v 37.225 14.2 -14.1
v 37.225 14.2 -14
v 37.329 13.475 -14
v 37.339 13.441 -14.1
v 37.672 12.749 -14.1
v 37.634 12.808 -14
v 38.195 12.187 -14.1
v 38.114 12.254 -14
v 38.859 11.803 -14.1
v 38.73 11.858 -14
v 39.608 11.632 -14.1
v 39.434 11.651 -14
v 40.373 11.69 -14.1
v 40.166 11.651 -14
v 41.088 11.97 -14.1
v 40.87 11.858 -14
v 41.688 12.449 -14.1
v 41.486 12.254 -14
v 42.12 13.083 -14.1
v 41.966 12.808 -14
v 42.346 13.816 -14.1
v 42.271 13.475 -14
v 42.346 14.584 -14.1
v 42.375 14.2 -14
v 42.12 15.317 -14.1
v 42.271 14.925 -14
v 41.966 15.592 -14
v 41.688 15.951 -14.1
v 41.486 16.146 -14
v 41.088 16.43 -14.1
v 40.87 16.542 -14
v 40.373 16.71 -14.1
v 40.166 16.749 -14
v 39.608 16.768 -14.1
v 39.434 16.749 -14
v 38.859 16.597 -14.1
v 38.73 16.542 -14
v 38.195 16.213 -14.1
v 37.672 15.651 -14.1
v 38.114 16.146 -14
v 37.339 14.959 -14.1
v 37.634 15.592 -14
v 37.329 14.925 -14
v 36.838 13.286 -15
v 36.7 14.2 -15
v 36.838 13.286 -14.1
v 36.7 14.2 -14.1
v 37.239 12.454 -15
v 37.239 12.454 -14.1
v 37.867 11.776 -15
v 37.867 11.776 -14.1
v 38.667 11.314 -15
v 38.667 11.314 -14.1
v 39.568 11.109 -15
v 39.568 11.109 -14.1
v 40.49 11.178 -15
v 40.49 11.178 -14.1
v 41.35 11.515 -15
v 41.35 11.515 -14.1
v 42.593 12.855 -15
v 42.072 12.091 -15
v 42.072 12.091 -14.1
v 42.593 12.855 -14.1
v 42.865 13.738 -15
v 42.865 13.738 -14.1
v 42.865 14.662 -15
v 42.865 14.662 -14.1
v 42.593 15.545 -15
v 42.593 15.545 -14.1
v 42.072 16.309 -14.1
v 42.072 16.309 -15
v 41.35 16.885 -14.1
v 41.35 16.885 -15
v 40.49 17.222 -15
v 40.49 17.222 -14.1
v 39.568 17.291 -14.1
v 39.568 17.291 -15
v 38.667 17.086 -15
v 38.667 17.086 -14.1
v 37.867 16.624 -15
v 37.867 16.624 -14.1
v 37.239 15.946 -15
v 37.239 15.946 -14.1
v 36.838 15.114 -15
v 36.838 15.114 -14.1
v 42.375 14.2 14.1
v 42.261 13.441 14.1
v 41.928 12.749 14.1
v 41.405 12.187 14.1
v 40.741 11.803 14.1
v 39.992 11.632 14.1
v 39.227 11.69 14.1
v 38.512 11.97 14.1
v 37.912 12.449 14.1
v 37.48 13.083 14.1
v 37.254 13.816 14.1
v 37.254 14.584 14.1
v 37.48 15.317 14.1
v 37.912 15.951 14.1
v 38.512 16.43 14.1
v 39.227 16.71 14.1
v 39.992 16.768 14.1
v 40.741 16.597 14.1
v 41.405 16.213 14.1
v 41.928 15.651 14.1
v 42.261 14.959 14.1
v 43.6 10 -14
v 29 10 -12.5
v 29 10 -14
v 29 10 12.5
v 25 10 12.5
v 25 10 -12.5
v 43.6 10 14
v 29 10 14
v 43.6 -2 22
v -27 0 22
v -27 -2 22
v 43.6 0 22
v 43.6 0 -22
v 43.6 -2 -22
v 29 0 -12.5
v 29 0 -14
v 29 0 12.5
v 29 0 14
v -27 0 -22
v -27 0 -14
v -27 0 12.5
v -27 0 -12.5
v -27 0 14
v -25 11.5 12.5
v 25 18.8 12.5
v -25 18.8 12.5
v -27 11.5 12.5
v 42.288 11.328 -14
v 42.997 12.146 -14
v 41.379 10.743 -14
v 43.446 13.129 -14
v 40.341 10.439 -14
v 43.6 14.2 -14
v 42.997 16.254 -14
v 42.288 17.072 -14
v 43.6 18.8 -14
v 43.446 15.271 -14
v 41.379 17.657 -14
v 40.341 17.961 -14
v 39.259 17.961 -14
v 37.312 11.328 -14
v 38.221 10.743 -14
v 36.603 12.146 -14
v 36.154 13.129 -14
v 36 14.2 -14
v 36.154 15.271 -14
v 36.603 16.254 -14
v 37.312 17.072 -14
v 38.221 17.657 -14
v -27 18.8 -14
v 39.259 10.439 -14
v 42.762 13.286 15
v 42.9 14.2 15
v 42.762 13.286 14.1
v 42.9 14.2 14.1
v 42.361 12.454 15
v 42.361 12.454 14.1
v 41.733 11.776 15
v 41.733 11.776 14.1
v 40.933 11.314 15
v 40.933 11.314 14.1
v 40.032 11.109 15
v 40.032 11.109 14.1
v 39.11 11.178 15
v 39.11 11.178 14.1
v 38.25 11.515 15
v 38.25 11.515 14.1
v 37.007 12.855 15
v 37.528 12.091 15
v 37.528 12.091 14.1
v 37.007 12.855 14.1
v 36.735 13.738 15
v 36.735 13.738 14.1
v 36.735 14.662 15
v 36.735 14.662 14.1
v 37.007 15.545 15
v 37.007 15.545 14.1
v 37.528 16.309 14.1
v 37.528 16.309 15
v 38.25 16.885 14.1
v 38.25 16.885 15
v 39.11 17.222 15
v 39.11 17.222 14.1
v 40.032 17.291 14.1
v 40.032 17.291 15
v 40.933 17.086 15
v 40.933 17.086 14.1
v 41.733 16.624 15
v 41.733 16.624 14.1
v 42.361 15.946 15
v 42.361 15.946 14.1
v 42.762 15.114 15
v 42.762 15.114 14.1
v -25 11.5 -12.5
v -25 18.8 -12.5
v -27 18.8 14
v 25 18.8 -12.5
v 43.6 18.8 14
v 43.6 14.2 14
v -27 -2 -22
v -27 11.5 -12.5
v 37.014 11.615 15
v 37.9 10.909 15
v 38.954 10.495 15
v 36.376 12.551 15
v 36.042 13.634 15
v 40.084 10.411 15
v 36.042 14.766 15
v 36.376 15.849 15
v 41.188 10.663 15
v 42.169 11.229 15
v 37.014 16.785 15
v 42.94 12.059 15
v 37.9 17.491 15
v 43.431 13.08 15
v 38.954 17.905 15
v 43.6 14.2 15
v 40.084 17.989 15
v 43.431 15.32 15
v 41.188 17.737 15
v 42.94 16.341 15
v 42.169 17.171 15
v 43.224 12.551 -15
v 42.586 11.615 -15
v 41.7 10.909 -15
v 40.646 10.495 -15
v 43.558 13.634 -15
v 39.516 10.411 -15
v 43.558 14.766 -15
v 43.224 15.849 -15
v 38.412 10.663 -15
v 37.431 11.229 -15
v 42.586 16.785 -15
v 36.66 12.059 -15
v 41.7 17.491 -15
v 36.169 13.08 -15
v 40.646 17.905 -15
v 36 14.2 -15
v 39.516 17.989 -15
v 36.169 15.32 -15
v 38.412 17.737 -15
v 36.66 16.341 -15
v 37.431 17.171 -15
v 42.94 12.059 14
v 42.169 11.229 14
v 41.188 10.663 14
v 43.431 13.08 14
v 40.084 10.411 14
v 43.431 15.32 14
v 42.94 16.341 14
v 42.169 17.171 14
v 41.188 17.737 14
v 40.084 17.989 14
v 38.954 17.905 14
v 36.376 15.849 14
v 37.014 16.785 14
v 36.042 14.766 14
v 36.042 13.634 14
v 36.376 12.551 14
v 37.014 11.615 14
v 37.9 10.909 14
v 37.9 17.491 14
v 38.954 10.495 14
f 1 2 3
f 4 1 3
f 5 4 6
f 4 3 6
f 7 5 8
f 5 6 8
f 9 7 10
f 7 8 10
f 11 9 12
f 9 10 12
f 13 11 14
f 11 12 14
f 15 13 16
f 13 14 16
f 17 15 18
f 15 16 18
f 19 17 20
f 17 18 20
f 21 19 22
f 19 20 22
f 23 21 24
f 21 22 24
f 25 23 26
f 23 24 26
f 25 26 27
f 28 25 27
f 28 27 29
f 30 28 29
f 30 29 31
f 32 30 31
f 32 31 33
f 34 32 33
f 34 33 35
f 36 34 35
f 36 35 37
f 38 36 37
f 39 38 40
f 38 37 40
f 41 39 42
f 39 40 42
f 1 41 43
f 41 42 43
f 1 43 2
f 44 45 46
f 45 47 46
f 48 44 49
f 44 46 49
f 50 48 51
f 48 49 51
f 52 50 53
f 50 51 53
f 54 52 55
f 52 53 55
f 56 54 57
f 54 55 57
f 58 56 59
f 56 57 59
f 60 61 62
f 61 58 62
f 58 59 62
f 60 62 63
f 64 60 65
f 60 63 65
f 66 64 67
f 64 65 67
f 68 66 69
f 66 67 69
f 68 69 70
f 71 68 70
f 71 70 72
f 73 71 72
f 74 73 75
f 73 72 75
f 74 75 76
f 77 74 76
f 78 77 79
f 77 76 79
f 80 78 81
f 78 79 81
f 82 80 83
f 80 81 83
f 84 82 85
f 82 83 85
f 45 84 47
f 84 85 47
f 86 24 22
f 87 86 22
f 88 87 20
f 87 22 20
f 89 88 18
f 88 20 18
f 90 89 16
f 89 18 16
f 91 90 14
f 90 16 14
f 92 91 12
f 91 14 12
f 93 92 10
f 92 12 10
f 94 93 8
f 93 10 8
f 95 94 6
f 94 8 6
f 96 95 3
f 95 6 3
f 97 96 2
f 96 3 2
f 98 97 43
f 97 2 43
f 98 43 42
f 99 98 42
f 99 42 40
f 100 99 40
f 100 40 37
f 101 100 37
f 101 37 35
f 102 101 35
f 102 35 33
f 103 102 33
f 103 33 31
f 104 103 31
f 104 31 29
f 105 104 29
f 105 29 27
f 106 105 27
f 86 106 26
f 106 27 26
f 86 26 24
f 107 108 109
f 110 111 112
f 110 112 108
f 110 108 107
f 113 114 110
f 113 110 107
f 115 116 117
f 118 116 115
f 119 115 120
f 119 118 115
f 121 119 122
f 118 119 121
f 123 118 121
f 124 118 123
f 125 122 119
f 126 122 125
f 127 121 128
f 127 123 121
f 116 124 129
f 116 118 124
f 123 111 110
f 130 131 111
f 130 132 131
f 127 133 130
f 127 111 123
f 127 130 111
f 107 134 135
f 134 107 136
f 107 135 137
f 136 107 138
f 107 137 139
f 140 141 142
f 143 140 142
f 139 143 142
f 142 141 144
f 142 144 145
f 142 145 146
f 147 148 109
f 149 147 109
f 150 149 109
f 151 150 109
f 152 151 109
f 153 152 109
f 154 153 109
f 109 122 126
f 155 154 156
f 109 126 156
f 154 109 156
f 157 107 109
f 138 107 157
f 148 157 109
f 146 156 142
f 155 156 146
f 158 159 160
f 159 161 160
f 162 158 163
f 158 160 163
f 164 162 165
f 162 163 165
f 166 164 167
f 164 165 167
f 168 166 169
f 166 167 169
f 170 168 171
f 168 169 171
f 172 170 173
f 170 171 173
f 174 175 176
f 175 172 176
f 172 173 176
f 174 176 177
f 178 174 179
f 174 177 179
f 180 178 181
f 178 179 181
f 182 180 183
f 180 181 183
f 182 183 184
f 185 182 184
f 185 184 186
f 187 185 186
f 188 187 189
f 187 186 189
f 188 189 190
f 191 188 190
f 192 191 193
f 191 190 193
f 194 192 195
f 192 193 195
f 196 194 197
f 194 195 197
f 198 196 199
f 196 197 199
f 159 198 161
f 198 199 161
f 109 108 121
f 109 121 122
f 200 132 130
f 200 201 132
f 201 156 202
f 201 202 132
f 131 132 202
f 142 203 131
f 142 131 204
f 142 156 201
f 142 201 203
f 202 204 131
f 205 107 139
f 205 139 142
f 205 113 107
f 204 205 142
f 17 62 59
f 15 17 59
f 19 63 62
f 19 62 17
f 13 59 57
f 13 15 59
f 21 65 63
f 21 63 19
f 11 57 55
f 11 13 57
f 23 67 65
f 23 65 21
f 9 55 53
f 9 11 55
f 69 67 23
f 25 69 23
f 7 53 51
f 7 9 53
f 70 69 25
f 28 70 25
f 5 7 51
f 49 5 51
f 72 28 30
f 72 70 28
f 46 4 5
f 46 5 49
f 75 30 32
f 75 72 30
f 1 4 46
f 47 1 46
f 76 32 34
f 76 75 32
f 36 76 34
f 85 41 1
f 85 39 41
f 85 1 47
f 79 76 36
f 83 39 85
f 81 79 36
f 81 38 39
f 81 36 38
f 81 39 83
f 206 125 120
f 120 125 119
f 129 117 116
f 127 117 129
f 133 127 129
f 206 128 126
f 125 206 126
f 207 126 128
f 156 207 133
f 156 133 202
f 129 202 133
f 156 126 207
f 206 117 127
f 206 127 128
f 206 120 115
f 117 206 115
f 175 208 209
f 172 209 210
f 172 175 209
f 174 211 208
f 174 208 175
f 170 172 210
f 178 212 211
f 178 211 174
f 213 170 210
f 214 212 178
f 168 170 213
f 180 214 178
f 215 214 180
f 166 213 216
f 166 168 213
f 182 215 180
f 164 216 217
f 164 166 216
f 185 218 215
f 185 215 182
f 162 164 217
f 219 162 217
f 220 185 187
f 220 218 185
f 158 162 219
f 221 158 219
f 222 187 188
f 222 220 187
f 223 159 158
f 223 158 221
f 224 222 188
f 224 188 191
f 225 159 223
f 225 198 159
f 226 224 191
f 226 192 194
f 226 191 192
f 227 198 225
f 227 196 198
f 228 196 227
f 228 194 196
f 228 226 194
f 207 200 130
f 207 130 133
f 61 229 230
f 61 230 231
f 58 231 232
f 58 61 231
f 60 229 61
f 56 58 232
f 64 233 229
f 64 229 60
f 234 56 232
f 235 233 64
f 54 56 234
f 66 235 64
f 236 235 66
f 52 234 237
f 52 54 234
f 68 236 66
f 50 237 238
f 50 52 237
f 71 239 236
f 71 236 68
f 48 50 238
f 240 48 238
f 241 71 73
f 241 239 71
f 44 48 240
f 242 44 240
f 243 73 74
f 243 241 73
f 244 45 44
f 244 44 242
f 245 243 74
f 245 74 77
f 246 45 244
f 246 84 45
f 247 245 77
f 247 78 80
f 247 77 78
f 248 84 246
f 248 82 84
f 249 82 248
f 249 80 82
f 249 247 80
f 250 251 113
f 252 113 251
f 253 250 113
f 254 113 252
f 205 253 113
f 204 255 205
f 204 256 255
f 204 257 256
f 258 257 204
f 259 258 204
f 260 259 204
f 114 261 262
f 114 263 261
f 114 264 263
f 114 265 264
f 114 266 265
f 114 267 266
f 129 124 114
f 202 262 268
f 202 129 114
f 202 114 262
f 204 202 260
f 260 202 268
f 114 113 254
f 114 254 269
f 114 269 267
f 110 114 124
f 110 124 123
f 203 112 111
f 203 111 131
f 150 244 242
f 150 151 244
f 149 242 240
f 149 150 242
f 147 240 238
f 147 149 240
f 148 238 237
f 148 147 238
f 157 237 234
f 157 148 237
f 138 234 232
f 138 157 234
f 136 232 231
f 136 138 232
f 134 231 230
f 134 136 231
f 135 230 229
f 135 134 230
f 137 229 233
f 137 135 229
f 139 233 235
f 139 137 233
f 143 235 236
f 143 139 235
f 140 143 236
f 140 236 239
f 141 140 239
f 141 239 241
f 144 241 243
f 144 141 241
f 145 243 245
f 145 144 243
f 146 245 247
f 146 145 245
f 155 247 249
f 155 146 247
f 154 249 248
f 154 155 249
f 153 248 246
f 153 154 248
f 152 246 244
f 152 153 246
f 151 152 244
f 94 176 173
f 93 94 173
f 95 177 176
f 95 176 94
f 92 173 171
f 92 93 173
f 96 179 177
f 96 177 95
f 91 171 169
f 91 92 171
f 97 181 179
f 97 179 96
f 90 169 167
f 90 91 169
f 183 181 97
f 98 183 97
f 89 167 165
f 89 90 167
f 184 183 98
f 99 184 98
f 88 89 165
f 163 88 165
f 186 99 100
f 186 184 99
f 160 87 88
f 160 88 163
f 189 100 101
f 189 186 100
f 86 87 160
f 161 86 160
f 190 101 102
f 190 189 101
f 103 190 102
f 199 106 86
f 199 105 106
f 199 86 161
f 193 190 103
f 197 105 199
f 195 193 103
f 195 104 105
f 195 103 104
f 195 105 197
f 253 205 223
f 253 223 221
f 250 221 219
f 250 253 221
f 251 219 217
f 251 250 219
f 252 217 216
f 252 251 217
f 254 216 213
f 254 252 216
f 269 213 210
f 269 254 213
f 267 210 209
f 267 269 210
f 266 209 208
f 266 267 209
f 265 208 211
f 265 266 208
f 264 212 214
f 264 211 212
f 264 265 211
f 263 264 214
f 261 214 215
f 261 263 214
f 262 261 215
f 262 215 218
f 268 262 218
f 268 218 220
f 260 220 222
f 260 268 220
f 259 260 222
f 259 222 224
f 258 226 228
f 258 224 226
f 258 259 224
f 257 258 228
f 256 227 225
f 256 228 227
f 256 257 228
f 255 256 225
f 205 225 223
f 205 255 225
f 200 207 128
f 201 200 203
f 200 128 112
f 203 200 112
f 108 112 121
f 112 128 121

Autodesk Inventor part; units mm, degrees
ref_plane "YZ Plane" through (0, 0, 0) normal (1, 0, 0) x (0, 1, 0)
ref_plane "XZ Plane" through (0, 0, 0) normal (0, 1, 0) x (-1, 0, 0)
ref_plane "XY Plane" through (0, 0, 0) normal (0, 0, 1) x (1, 0, 0)
sketch "Sketch1" plane through (0, 0, 0) normal (0, 1, 0) x (-1, 0, 0)
  line L0 (-25, 12.5) -> (25, 12.5)
  line L1 (25, 12.5) -> (25, -12.5)
  line L2 (25, -12.5) -> (-25, -12.5)
  line L3 (-25, -12.5) -> (-25, 12.5)
  line L4 (-25, 12.5) -> (25, -12.5) construction
  line L5 (25, 12.5) -> (-25, -12.5) construction
  line L6 (27, 14) -> (27, -14)
  line L7 (-25, 12.5) -> (-25, 14)
  line L8 (-25, 14) -> (27, 14)
  line L9 (27, -14) -> (-25, -14)
  line L10 (-25, -14) -> (-25, -12.5)
  line L11 (25, 12.5) -> (27, 12.5)
  line L12 (25, -12.5) -> (27, -12.5)
  line L13 (-25, -14) -> (27, -14)
  line L14 (27, -14) -> (27, -22)
  line L15 (27, -22) -> (-25, -22)
  line L16 (-25, -22) -> (-25, -14)
  line L17 (27, 0) -> (-25, 0)
  line L18 (-25, 14) -> (27, 14)
  line L19 (27, 14) -> (27, 22)
  line L20 (27, 22) -> (-25, 22)
  line L21 (-25, 22) -> (-25, 14)
  point P0 (0, 0)
  point P1 (27, 14)
  dimension "d0" = 25
  dimension "d1" = 50
  dimension "d2" = 2
  dimension "d3" = 1.5
  dimension "d4" = 1.5
  dimension "d60" = 8
extrude "Extrusion1" add sketch "Sketch1" against normal blind 2 contours L7 L8 L6 L11 L0 | L0 L1 L17 L3 | L11 L6 L17 L1 | L17 L1 L2 L3 | L17 L6 L12 L1 | L2 L12 L6 L9 L10
extrude "Extrusion2" add sketch "Sketch1" along normal blind 18.8 contours L7 L8 L6 L11 L0 | L2 L12 L6 L9 L10
sketch "Sketch2" plane through (-27, 0, -12.5) normal (0, 0, 1) x (1, 0, 0)
  line L0 (0, 18.8) -> (0, 20)
  line L1 (0, 0) -> (0, 18.8) projected
  line L2 (0, 18.8) -> (2, 18.8)
  line L3 (0, 18.8) -> (52, 18.8) projected
  line L4 (2, 18.8) -> (2, 11.5)
  line L5 (52, 0) -> (0, 0) projected
  line L6 (2, 11.5) -> (0, 11.5)
  line L7 (0, -2) -> (0, 18.8) projected
  point P0 (27, 0)
  dimension "d13" = 11.5
  dimension "d14" = 20
  dimension "d15" = 2
extrude "Extrusion3" add sketch "Sketch2" along normal up to surface (25 mm away)
sketch "Sketch4" plane through (-27, -2, 14) normal (0, 0, 1) x (1, 0, 0)
  circle A0 centre (66.8, 16.2) radius 2.575
  circle A1 centre (66.8, 16.2) radius 3.1
  circle A2 centre (66.8, 16.2) radius 3.8
  line L0 (52, 2) -> (52, 20.8) projected
  line L1 (52, 12) -> (70.6, 12)
  line L2 (70.6, 12) -> (70.6, 20.8)
  line L3 (70.6, 20.8) -> (52, 20.8)
  point P0 (27, 2)
  dimension "d31" = 5.15
  dimension "d32" = 6.2
  dimension "d33" = 0.7
  dimension "d34" = 10
  dimension "d35" = 14.2
  dimension "d61" = 18.6
extrude "Extrusion4" add sketch "Sketch4" against normal up to surface (28 mm away) contours A1 | A2 | L2 L1 L0 L3
sketch "Sketch5" plane through (25, -2, 14) normal (1, 0, 0) x (0, 0, -1)
  line L0 (0, 0) -> (0, 12) projected
  line L1 (0, 2) -> (28, 2)
  line L2 (28, 0) -> (28, 12) projected
  line L3 (1.5, 2) -> (26.5, 2) projected
  line L4 (28, 12) -> (26.5, 12) projected
  line L5 (26.5, 2) -> (26.5, 12) projected
  line L6 (1.5, 12) -> (1.5, 2) projected
  line L7 (26.5, 12) -> (1.5, 12) projected
  line L8 (26.5, 12) -> (26.5, 20.8) projected
  line L9 (26.5, 20.8) -> (28, 20.8) projected
  line L10 (28, 20.8) -> (28, 12) projected
  line L11 (28, 12) -> (28, 0) projected
  line L12 (28, 0) -> (0, 0) projected
  line L13 (0, 0) -> (0, 12) projected
  line L14 (0, 12) -> (0, 20.8) projected
  line L15 (0, 20.8) -> (1.5, 20.8) projected
  line L16 (1.5, 20.8) -> (1.5, 12) projected
  line L17 (1.5, 12) -> (0, 12) projected
  line L18 (1.5, 20.8) -> (26.5, 20.8) projected
  line L19 (1.5, 2) -> (26.5, 2) projected
  point P0 (14, 2)
extrude "Extrusion6" add sketch "Sketch5" along normal up to surface (18.6 mm away) contours L0 L1 L2 L12
extrude "Extrusion8" add sketch "Sketch5" along normal blind 4 contours L0 L17 L6 L1 | L1 L5 L4 L2
extrude "Extrusion9" add sketch "Sketch4" along normal blind 1 contours A2
extrude "Extrusion10" add sketch "Sketch4" along normal blind 0.1 contours A1
sketch "Sketch7" plane through (-27, -2, -14) normal (0, 0, -1) x (-1, 0, 0)
  circle A0 centre (-66.8, 16.2) radius 3.8 projected
  circle A1 centre (-66.8, 16.2) radius 3.1 projected
  circle A2 centre (-66.8, 16.2) radius 3.1 projected
  circle A3 centre (-66.8, 16.2) radius 2.575 projected
  point P0 (-27, 2)
extrude "Extrusion11" add sketch "Sketch7" along normal blind 0.1 contours A1
extrude "Extrusion12" add sketch "Sketch7" along normal blind 1 contours A0
extrude "Extrusion13" add sketch "Sketch1" against normal up to surface (2 mm away) contours L21 L20 L19 L8 | L9 L14 L15 L16
sketch "Sketch8" plane through (25, 0, 22) normal (1, 0, 0) x (0, 0, -1)
  line L0 (0, -2) -> (8, -2) projected
  line L1 (8, 0) -> (8, -2) projected
  line L2 (0, 0) -> (8, 0) projected
  line L3 (0, 0) -> (0, -2) projected
  line L4 (36, -2) -> (44, -2) projected
  line L5 (44, 0) -> (44, -2) projected
  line L6 (36, 0) -> (44, 0) projected
  line L7 (36, -2) -> (36, 0) projected
  point P0 (22, 0)
extrude "Extrusion14" add sketch "Sketch8" along normal up to surface (18.6 mm away)
equation "\"d4\" = d3"
equation "\"d15\" = d2"
properties part number "chaimber"
